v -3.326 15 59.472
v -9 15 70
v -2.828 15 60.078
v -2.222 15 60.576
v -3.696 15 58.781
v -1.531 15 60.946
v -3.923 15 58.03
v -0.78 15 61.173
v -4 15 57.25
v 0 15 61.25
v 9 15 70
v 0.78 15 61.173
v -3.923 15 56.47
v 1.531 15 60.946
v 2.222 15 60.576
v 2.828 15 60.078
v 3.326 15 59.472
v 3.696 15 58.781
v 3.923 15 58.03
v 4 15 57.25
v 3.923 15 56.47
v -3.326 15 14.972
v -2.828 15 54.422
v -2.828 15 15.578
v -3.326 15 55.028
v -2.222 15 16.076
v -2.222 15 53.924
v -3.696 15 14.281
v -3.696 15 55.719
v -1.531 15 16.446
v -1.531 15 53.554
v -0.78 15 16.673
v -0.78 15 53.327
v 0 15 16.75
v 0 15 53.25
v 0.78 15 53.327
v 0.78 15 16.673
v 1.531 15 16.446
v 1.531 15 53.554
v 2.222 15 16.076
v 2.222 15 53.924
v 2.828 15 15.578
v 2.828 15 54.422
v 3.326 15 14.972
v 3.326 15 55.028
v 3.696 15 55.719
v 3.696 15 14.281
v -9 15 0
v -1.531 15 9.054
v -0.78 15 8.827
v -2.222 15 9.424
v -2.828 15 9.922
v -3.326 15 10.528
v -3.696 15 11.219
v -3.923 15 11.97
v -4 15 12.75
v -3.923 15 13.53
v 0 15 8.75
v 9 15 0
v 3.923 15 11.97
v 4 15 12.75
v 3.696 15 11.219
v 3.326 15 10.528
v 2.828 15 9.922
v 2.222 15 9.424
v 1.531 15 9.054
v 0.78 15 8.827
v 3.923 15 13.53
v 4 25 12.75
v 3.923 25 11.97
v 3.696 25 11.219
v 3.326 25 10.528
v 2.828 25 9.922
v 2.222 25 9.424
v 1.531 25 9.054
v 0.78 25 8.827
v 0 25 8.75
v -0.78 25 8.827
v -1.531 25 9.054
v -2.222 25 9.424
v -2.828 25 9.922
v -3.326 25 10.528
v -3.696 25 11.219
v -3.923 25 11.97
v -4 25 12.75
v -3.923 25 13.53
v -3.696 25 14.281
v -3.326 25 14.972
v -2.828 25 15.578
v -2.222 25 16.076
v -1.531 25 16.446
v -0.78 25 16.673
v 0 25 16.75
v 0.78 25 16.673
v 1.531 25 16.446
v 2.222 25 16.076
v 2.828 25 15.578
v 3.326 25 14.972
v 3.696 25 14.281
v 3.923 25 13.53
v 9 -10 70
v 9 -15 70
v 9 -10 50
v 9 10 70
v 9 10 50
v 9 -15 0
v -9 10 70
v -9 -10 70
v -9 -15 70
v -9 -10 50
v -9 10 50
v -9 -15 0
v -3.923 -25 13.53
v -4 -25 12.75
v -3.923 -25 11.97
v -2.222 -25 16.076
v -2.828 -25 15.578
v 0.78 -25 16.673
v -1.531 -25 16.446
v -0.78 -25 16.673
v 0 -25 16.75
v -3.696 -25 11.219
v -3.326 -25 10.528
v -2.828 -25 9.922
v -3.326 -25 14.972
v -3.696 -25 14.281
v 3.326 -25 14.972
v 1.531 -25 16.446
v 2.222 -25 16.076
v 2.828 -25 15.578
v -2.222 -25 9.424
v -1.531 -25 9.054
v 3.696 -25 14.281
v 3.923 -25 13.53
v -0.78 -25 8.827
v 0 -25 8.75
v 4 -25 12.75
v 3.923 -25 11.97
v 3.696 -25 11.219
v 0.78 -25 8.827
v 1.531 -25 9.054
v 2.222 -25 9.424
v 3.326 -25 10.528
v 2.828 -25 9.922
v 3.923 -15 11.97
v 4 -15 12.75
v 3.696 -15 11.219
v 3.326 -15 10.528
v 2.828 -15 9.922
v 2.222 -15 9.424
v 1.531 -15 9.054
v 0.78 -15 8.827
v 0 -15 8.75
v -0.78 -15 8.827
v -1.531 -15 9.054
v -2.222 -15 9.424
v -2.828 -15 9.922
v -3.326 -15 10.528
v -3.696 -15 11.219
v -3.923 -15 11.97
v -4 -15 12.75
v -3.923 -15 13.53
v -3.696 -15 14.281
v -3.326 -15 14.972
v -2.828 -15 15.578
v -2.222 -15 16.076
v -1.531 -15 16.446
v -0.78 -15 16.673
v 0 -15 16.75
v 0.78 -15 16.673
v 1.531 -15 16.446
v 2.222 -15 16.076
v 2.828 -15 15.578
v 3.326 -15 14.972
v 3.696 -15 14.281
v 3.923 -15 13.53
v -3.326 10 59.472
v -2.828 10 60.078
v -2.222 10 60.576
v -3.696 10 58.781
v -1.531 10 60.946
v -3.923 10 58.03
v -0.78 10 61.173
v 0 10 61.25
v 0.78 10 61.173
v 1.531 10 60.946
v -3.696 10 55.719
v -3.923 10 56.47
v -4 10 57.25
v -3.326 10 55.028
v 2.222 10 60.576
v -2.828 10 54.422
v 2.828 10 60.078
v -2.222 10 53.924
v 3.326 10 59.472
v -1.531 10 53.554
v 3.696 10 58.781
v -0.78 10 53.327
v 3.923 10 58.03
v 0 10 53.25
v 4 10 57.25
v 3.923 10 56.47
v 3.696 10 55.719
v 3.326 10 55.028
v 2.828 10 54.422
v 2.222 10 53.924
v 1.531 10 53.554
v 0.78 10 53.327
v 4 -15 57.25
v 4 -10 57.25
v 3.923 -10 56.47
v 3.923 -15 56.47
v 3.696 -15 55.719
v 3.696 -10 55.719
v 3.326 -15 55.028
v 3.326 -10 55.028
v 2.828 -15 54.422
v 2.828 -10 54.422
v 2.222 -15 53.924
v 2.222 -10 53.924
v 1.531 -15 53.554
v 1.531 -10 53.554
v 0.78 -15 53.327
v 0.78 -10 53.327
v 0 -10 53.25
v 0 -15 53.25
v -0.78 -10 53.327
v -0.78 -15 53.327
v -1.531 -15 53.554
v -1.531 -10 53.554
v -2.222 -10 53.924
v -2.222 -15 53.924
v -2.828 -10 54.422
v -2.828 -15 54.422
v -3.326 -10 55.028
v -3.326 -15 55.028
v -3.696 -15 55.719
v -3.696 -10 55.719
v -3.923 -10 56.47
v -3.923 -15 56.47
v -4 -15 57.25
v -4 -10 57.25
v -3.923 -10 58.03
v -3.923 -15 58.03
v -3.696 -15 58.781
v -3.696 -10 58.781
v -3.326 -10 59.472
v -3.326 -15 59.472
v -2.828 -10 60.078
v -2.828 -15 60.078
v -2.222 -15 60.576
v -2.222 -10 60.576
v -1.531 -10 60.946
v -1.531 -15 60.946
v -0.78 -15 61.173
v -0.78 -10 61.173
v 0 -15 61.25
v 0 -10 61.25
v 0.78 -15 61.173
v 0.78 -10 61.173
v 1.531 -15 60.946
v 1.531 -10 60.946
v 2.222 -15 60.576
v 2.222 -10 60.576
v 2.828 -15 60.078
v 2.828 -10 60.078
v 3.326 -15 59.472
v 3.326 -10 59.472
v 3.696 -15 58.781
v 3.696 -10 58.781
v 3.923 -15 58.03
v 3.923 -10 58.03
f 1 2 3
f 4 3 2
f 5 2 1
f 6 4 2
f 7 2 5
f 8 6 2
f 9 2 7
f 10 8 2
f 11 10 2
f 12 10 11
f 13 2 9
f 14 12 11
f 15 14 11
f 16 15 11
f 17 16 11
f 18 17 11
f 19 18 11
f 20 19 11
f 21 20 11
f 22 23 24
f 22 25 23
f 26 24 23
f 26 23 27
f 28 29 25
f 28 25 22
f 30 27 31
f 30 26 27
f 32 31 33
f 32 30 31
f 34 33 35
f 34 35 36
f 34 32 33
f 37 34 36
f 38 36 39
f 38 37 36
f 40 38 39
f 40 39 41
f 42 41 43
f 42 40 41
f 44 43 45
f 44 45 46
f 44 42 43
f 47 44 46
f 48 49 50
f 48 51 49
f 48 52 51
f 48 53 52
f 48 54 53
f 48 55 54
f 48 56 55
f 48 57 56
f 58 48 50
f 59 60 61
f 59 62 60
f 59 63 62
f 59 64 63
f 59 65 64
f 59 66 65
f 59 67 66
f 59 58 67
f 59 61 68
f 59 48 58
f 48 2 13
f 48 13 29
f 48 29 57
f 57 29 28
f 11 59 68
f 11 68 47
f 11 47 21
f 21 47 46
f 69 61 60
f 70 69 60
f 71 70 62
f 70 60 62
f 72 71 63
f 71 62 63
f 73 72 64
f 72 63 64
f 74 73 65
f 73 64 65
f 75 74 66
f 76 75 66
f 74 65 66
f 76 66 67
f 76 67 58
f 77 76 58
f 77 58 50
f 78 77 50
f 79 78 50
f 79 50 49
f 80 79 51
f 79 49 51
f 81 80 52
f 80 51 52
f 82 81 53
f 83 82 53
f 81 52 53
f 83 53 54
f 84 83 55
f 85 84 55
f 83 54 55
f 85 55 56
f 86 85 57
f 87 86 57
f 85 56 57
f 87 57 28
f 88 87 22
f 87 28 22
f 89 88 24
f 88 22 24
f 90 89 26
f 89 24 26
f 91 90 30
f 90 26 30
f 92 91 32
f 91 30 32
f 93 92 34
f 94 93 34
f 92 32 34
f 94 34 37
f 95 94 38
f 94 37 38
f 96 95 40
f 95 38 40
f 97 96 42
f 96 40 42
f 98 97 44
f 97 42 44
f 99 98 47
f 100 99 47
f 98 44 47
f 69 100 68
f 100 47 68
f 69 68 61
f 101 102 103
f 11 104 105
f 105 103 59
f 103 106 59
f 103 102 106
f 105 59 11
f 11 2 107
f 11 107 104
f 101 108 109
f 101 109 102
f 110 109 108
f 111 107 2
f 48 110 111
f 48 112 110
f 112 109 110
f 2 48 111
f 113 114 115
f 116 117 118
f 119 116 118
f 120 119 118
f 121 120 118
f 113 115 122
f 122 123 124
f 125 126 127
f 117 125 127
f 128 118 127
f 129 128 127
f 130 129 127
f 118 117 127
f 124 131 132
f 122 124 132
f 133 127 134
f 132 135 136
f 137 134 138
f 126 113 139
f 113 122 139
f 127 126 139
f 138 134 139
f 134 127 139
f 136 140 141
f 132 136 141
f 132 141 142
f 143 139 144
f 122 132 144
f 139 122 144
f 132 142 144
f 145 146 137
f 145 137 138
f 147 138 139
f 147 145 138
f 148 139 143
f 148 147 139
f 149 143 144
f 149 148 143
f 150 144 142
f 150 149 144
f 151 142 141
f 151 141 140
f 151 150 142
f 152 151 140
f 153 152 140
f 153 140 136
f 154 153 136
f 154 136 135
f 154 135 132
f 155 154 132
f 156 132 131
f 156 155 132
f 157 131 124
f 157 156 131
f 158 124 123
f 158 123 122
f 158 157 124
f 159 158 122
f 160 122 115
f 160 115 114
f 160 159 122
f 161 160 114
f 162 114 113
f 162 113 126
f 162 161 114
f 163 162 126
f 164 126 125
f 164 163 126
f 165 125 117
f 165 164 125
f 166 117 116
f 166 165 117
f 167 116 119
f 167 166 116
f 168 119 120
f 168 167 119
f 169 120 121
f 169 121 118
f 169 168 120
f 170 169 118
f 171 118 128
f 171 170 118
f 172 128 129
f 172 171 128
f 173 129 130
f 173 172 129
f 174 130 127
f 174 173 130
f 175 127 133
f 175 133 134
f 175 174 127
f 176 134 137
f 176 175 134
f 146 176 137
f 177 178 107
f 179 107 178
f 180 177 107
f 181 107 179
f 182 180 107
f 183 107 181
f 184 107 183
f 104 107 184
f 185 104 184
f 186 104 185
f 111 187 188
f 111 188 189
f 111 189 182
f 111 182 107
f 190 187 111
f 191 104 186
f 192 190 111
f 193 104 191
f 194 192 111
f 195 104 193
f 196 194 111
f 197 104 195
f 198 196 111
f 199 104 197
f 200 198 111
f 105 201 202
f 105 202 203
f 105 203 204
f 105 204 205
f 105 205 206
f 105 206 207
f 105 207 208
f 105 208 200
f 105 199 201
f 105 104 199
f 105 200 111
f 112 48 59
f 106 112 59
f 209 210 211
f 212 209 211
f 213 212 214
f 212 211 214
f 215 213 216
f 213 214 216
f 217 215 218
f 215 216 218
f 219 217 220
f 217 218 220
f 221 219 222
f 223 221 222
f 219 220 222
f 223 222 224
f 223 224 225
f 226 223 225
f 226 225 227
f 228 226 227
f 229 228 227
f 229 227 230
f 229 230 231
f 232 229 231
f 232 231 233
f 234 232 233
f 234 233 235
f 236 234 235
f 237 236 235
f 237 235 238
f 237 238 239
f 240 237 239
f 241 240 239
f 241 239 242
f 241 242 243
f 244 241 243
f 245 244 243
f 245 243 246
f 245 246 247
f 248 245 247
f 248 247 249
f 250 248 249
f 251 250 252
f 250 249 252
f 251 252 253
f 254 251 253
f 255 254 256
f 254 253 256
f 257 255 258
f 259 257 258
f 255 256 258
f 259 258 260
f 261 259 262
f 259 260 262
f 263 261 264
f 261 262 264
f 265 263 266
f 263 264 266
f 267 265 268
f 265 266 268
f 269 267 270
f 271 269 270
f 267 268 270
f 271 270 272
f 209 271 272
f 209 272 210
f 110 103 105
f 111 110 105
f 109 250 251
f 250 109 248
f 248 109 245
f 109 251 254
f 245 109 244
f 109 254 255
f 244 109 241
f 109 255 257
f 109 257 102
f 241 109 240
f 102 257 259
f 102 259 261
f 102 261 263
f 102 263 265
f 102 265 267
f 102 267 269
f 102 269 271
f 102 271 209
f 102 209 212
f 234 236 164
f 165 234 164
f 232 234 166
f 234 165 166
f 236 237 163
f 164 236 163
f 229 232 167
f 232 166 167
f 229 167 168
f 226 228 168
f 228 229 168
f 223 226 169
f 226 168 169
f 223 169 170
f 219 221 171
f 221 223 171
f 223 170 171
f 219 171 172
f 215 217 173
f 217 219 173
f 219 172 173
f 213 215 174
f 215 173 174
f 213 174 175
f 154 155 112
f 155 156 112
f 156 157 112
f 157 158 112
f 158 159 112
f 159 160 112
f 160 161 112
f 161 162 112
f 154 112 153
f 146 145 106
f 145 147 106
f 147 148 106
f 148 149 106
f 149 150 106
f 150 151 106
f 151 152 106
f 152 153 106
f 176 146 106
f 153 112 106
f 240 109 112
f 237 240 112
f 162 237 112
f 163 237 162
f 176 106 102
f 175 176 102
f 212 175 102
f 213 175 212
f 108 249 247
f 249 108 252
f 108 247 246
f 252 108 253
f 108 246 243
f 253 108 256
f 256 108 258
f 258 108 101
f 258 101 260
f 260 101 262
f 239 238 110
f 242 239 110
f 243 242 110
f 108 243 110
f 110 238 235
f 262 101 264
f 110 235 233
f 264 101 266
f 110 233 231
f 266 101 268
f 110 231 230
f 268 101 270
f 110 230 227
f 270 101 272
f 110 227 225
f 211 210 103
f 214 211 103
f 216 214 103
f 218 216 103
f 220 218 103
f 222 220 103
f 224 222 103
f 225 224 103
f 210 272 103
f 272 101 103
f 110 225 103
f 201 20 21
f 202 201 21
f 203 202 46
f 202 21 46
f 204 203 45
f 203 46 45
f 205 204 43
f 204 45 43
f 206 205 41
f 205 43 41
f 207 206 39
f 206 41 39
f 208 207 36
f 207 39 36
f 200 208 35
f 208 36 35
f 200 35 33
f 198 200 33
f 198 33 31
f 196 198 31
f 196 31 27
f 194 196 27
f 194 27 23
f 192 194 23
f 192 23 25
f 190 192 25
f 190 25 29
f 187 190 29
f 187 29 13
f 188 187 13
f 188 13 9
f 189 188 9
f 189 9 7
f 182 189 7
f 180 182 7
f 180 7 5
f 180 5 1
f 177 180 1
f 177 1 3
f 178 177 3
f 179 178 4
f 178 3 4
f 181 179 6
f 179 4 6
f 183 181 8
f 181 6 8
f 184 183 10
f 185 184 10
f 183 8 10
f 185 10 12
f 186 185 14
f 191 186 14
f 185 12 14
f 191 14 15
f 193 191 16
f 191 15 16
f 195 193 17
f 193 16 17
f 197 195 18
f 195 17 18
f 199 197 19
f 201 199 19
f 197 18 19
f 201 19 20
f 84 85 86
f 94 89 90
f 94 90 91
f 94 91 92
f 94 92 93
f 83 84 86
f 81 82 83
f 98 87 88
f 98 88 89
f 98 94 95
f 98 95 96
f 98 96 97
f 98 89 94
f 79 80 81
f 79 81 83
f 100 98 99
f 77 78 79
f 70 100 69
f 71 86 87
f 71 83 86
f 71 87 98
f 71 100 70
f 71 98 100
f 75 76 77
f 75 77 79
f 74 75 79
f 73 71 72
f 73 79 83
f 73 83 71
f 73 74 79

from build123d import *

# Parameters (mm, degrees)
ESQUISSE1_W             = 18
ESQUISSE1_H             = 30
BOSS_EXTRU_1_DEPTH      = 70
ESQUISSE2_R             = 4
BOSS_EXTRU_2_DEPTH      = 10
ESQUISSE3_R             = 4
ENL_V_MAT_EXTRU_1_DEPTH = 52
ESQUISSE4_W             = 20
ESQUISSE4_H             = 20
ENL_V_MAT_EXTRU_2_DEPTH = 52


with BuildPart() as part:
    # Esquisse1 → Boss.-Extru.1 (new body)
    with BuildSketch(Plane.XY):
        Rectangle(ESQUISSE1_W, ESQUISSE1_H)
    extrude(amount=BOSS_EXTRU_1_DEPTH)

    # Esquisse2 → Boss.-Extru.2 (add)
    with BuildSketch(Plane(origin=(0, 15, 0), x_dir=(1, 0, 0), z_dir=(0, 1, 0))):
        with Locations((0, -12.75)):
            Circle(ESQUISSE2_R)
    boss_extru_2 = extrude(amount=BOSS_EXTRU_2_DEPTH)

    # Symétrie1: Boss.-Extru.2 across plane
    add(boss_extru_2.mirror(Plane.ZX))

    # Symétrie2: Boss.-Extru.2 across plane
    add(boss_extru_2.mirror(Plane.XY.offset(35)))

    # Esquisse3 → Enlèv. mat.-Extru.1 (cut)
    with BuildSketch(Plane(origin=(0, 25, 0), x_dir=(1, 0, 0), z_dir=(0, 1, 0))):
        with Locations((0, -57.25)):
            Circle(ESQUISSE3_R)
    extrude(amount=-ENL_V_MAT_EXTRU_1_DEPTH, mode=Mode.SUBTRACT)

    # Esquisse4 → Enlèv. mat.-Extru.2 (cut)
    with BuildSketch(Plane(origin=(9, 0, 0), x_dir=(0, 0, -1), z_dir=(1, 0, 0))):
        with Locations((-60, 0)):
            Rectangle(ESQUISSE4_W, ESQUISSE4_H)
    extrude(amount=-ENL_V_MAT_EXTRU_2_DEPTH, mode=Mode.SUBTRACT)


solid = part.part
